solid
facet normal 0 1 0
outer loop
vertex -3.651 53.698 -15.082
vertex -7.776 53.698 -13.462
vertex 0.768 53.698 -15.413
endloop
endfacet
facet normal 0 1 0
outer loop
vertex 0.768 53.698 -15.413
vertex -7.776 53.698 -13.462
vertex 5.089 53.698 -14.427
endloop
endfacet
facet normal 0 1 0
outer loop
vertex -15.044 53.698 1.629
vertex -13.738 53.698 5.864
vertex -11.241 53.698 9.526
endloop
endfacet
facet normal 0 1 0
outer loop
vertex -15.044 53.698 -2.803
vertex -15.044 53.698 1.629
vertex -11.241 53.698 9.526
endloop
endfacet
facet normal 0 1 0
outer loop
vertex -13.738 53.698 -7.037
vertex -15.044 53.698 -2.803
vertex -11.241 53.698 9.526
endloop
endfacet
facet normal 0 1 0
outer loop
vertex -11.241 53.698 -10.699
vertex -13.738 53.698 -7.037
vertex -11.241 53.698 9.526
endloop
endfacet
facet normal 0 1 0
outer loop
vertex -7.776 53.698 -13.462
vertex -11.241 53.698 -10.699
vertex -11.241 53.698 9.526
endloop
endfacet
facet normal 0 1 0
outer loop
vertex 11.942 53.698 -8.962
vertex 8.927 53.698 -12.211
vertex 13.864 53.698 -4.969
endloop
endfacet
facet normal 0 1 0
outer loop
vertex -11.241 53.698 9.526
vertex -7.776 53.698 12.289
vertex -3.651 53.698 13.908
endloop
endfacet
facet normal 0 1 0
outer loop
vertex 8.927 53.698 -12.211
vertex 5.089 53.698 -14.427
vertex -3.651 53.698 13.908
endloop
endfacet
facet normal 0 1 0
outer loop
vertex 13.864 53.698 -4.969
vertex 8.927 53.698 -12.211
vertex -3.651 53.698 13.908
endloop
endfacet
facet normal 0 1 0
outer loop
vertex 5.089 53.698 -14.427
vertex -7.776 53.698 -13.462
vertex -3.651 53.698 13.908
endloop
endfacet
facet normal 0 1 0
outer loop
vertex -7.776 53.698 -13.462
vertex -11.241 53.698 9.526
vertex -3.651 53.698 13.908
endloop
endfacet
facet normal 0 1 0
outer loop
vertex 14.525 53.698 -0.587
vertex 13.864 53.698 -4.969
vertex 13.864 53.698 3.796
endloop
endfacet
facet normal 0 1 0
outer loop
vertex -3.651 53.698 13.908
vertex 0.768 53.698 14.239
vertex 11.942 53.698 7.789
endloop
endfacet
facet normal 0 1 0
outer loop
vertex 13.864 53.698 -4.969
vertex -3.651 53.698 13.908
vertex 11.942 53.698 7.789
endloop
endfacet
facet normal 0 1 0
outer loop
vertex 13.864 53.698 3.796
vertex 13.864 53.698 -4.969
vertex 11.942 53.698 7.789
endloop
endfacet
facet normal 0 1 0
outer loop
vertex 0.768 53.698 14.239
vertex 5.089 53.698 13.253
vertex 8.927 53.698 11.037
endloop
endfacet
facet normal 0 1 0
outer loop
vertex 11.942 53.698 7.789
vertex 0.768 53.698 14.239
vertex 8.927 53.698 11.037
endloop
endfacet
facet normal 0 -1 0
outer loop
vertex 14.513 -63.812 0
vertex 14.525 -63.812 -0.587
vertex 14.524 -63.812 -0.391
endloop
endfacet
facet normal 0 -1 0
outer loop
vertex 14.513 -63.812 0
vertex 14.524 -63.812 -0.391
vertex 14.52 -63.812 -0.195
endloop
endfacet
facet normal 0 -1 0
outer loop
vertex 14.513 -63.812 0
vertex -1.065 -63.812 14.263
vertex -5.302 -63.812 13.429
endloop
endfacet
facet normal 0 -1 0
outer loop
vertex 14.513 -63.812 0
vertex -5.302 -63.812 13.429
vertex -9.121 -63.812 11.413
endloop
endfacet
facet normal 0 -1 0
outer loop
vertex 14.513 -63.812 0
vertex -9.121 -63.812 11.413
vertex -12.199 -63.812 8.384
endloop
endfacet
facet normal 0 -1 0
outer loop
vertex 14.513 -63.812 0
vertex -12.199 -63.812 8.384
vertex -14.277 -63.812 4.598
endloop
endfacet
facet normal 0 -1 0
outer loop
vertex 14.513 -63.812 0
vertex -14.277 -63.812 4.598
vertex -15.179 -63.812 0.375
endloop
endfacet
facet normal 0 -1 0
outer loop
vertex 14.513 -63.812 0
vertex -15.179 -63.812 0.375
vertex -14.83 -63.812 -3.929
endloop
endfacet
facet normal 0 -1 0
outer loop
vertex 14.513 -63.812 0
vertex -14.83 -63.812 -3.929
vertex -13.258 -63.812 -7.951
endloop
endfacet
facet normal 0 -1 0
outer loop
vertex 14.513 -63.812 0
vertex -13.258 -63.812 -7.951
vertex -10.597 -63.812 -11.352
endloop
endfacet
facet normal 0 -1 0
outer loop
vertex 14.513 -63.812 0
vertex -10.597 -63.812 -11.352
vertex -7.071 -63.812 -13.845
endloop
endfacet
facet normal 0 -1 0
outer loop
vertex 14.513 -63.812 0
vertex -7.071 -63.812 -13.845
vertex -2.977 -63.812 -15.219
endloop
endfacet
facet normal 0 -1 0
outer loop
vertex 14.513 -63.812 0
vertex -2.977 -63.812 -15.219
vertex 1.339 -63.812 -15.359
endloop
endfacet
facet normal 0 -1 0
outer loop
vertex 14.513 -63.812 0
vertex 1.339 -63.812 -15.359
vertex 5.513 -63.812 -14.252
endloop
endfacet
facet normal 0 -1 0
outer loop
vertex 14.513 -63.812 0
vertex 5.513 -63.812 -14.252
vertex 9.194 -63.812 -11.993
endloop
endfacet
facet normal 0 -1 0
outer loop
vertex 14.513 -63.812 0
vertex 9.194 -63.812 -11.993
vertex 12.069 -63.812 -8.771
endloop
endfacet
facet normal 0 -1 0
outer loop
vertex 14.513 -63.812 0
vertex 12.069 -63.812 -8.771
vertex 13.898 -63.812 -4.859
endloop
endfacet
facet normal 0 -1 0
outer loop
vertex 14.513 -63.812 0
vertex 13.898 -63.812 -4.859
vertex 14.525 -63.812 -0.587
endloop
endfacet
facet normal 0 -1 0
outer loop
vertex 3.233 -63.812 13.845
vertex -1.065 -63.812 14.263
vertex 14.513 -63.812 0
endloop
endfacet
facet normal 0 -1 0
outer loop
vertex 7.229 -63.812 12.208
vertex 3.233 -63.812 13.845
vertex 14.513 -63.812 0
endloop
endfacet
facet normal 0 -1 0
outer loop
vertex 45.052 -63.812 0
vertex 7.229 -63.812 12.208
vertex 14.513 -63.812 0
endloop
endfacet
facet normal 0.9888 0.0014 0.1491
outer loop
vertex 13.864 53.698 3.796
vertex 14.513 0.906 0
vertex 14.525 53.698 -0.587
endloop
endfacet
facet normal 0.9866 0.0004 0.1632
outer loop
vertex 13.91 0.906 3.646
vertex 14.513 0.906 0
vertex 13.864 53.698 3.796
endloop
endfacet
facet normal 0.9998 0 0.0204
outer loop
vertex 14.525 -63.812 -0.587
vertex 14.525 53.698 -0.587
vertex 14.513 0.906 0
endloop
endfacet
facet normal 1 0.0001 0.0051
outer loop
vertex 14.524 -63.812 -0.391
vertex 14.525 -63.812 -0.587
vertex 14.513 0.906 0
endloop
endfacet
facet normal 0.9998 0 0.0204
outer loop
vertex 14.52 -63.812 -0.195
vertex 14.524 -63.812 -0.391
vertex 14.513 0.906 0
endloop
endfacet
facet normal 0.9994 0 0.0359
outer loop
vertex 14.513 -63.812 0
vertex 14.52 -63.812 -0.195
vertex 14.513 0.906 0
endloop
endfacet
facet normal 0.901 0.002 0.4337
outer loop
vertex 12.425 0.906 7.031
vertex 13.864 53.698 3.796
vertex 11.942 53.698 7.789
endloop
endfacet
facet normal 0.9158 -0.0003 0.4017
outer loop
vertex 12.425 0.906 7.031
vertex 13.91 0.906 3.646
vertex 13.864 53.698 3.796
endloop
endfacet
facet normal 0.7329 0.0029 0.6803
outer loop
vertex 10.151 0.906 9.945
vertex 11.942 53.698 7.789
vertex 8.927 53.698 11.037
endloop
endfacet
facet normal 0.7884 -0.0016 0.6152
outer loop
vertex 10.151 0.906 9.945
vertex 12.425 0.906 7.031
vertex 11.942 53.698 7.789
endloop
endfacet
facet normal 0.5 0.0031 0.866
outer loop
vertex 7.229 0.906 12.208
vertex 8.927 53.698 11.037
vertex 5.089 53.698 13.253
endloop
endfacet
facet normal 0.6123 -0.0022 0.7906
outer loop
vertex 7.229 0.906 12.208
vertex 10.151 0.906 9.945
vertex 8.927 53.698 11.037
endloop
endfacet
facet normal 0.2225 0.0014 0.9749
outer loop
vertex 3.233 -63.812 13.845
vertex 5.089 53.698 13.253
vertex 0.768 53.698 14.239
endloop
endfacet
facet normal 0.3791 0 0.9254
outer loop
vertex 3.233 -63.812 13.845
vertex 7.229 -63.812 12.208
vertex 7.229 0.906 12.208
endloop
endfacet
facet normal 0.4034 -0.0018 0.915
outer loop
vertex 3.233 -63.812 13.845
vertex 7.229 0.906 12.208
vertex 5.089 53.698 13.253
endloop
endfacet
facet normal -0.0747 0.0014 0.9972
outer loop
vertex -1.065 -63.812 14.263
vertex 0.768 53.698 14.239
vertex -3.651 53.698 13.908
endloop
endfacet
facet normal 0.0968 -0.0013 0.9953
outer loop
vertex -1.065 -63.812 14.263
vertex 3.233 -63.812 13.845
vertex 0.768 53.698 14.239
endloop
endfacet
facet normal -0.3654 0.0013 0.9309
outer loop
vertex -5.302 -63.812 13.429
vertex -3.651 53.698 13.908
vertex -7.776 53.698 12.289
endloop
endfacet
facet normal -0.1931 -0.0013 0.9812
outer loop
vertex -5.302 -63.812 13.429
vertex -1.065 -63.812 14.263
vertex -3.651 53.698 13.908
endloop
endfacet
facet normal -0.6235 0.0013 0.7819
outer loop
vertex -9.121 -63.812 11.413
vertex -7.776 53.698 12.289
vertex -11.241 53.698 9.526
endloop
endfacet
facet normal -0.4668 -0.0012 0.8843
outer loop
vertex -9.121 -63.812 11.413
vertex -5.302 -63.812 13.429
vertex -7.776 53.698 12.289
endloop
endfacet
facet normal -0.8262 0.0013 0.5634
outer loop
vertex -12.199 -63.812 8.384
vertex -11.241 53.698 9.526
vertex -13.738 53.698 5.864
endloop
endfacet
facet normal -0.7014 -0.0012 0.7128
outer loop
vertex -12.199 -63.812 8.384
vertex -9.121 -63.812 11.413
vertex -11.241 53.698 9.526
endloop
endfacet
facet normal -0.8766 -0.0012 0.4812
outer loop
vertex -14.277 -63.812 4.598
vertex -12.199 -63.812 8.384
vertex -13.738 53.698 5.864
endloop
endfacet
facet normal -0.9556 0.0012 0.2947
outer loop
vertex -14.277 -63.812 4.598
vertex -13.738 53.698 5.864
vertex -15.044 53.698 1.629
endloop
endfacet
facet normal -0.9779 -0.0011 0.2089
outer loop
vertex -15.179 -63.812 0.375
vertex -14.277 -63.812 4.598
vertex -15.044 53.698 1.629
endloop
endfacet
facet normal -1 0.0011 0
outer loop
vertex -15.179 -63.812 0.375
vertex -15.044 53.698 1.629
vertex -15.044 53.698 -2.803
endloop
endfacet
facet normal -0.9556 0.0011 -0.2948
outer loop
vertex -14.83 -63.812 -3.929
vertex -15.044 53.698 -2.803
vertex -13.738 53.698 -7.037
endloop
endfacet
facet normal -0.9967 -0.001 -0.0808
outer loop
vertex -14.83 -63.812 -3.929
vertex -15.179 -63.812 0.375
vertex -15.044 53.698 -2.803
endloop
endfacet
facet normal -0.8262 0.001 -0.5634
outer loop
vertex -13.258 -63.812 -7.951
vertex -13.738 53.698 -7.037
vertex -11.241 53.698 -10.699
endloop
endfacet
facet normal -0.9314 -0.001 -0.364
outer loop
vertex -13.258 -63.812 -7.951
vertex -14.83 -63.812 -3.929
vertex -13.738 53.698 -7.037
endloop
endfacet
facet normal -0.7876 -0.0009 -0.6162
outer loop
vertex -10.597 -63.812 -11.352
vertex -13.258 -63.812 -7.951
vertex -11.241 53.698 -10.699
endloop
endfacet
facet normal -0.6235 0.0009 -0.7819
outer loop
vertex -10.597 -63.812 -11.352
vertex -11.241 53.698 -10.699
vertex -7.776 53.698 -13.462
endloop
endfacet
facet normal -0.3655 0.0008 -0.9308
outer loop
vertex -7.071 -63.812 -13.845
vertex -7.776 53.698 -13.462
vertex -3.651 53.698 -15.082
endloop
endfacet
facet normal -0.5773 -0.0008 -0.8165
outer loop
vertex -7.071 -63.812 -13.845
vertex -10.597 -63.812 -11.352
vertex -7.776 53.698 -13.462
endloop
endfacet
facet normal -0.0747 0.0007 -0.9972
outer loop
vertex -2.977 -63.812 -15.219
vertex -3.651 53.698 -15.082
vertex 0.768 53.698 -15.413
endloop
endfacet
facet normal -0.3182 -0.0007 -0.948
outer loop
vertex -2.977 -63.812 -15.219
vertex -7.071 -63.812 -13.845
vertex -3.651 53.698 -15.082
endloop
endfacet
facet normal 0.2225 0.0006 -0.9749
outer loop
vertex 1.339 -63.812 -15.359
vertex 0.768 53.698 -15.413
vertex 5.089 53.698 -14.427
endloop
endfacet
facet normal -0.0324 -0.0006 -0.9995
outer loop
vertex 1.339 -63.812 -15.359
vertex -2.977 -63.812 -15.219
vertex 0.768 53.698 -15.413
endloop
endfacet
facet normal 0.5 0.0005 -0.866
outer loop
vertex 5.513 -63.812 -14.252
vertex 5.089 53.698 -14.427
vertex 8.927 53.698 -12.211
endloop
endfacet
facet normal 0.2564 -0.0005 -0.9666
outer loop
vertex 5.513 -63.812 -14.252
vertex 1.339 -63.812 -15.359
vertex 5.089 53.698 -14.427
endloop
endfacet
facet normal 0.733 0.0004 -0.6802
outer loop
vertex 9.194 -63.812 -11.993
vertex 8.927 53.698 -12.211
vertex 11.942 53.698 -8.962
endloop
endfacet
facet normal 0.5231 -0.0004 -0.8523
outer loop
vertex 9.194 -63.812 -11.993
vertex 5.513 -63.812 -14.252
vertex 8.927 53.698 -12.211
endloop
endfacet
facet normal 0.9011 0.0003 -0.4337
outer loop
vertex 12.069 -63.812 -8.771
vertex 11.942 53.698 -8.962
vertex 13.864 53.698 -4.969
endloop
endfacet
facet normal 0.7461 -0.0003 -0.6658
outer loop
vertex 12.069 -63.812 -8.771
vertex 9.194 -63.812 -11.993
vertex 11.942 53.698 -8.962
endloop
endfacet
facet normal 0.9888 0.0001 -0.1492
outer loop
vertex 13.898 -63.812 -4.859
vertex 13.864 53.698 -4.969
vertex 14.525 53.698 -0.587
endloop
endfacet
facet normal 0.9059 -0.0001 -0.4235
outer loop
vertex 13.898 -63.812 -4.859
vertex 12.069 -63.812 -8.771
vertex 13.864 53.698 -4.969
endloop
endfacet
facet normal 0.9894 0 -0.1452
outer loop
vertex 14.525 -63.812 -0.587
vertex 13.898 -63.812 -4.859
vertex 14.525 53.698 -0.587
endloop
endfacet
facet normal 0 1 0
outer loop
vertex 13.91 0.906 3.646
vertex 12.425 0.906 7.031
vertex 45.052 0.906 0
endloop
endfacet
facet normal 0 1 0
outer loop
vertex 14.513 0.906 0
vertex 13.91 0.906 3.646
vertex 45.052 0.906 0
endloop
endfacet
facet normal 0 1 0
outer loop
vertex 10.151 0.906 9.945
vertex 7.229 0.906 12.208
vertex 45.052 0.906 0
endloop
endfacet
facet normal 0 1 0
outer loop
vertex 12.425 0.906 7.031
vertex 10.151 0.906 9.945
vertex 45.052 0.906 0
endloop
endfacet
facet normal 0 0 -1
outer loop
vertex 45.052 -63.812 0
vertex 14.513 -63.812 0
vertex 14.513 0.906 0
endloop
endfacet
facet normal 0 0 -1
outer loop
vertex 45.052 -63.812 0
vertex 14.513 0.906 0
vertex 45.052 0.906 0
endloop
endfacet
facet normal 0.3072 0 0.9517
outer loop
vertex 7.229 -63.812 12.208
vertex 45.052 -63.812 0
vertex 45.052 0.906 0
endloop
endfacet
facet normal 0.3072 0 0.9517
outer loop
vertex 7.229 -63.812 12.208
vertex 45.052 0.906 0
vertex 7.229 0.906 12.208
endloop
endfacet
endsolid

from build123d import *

# Parameters (mm, degrees)
F0_R     = 14.8676194835
F1_DEPTH = 63.81162256
F2_DEPTH = 53.6982640624
F4_DEPTH = 64.7173374891


with BuildPart() as f1:
    # F0 (on Front) → F1 (new body)
    with BuildSketch(Plane.XZ):
        with Locations((-0.3426838666, -0.586660404)):
            Circle(F0_R)
    extrude(amount=F1_DEPTH)

    # F2 (add): a face of the model
    f2_faces = [f1.faces().sort_by_distance(p)[0] for p in [
        (-0.3426838666, 0, -0.586660404),
    ]]
    extrude(f2_faces, amount=F2_DEPTH)

    # F3 (on face) → F4 (join)
    with BuildSketch(Plane.XZ.offset(63.81162256)):
        with BuildLine():
            ThreePointArc((7.2291272221, 12.2084084096), (12.4249878258, 7.0312572026), (14.5133566111, 0))
            Line((14.5133566111, 0), (45.0522339435, 0))
            Line((45.0522339435, 0), (7.2291272221, 12.2084084096))
        make_face()
    extrude(amount=-F4_DEPTH)


solid = f1.part
